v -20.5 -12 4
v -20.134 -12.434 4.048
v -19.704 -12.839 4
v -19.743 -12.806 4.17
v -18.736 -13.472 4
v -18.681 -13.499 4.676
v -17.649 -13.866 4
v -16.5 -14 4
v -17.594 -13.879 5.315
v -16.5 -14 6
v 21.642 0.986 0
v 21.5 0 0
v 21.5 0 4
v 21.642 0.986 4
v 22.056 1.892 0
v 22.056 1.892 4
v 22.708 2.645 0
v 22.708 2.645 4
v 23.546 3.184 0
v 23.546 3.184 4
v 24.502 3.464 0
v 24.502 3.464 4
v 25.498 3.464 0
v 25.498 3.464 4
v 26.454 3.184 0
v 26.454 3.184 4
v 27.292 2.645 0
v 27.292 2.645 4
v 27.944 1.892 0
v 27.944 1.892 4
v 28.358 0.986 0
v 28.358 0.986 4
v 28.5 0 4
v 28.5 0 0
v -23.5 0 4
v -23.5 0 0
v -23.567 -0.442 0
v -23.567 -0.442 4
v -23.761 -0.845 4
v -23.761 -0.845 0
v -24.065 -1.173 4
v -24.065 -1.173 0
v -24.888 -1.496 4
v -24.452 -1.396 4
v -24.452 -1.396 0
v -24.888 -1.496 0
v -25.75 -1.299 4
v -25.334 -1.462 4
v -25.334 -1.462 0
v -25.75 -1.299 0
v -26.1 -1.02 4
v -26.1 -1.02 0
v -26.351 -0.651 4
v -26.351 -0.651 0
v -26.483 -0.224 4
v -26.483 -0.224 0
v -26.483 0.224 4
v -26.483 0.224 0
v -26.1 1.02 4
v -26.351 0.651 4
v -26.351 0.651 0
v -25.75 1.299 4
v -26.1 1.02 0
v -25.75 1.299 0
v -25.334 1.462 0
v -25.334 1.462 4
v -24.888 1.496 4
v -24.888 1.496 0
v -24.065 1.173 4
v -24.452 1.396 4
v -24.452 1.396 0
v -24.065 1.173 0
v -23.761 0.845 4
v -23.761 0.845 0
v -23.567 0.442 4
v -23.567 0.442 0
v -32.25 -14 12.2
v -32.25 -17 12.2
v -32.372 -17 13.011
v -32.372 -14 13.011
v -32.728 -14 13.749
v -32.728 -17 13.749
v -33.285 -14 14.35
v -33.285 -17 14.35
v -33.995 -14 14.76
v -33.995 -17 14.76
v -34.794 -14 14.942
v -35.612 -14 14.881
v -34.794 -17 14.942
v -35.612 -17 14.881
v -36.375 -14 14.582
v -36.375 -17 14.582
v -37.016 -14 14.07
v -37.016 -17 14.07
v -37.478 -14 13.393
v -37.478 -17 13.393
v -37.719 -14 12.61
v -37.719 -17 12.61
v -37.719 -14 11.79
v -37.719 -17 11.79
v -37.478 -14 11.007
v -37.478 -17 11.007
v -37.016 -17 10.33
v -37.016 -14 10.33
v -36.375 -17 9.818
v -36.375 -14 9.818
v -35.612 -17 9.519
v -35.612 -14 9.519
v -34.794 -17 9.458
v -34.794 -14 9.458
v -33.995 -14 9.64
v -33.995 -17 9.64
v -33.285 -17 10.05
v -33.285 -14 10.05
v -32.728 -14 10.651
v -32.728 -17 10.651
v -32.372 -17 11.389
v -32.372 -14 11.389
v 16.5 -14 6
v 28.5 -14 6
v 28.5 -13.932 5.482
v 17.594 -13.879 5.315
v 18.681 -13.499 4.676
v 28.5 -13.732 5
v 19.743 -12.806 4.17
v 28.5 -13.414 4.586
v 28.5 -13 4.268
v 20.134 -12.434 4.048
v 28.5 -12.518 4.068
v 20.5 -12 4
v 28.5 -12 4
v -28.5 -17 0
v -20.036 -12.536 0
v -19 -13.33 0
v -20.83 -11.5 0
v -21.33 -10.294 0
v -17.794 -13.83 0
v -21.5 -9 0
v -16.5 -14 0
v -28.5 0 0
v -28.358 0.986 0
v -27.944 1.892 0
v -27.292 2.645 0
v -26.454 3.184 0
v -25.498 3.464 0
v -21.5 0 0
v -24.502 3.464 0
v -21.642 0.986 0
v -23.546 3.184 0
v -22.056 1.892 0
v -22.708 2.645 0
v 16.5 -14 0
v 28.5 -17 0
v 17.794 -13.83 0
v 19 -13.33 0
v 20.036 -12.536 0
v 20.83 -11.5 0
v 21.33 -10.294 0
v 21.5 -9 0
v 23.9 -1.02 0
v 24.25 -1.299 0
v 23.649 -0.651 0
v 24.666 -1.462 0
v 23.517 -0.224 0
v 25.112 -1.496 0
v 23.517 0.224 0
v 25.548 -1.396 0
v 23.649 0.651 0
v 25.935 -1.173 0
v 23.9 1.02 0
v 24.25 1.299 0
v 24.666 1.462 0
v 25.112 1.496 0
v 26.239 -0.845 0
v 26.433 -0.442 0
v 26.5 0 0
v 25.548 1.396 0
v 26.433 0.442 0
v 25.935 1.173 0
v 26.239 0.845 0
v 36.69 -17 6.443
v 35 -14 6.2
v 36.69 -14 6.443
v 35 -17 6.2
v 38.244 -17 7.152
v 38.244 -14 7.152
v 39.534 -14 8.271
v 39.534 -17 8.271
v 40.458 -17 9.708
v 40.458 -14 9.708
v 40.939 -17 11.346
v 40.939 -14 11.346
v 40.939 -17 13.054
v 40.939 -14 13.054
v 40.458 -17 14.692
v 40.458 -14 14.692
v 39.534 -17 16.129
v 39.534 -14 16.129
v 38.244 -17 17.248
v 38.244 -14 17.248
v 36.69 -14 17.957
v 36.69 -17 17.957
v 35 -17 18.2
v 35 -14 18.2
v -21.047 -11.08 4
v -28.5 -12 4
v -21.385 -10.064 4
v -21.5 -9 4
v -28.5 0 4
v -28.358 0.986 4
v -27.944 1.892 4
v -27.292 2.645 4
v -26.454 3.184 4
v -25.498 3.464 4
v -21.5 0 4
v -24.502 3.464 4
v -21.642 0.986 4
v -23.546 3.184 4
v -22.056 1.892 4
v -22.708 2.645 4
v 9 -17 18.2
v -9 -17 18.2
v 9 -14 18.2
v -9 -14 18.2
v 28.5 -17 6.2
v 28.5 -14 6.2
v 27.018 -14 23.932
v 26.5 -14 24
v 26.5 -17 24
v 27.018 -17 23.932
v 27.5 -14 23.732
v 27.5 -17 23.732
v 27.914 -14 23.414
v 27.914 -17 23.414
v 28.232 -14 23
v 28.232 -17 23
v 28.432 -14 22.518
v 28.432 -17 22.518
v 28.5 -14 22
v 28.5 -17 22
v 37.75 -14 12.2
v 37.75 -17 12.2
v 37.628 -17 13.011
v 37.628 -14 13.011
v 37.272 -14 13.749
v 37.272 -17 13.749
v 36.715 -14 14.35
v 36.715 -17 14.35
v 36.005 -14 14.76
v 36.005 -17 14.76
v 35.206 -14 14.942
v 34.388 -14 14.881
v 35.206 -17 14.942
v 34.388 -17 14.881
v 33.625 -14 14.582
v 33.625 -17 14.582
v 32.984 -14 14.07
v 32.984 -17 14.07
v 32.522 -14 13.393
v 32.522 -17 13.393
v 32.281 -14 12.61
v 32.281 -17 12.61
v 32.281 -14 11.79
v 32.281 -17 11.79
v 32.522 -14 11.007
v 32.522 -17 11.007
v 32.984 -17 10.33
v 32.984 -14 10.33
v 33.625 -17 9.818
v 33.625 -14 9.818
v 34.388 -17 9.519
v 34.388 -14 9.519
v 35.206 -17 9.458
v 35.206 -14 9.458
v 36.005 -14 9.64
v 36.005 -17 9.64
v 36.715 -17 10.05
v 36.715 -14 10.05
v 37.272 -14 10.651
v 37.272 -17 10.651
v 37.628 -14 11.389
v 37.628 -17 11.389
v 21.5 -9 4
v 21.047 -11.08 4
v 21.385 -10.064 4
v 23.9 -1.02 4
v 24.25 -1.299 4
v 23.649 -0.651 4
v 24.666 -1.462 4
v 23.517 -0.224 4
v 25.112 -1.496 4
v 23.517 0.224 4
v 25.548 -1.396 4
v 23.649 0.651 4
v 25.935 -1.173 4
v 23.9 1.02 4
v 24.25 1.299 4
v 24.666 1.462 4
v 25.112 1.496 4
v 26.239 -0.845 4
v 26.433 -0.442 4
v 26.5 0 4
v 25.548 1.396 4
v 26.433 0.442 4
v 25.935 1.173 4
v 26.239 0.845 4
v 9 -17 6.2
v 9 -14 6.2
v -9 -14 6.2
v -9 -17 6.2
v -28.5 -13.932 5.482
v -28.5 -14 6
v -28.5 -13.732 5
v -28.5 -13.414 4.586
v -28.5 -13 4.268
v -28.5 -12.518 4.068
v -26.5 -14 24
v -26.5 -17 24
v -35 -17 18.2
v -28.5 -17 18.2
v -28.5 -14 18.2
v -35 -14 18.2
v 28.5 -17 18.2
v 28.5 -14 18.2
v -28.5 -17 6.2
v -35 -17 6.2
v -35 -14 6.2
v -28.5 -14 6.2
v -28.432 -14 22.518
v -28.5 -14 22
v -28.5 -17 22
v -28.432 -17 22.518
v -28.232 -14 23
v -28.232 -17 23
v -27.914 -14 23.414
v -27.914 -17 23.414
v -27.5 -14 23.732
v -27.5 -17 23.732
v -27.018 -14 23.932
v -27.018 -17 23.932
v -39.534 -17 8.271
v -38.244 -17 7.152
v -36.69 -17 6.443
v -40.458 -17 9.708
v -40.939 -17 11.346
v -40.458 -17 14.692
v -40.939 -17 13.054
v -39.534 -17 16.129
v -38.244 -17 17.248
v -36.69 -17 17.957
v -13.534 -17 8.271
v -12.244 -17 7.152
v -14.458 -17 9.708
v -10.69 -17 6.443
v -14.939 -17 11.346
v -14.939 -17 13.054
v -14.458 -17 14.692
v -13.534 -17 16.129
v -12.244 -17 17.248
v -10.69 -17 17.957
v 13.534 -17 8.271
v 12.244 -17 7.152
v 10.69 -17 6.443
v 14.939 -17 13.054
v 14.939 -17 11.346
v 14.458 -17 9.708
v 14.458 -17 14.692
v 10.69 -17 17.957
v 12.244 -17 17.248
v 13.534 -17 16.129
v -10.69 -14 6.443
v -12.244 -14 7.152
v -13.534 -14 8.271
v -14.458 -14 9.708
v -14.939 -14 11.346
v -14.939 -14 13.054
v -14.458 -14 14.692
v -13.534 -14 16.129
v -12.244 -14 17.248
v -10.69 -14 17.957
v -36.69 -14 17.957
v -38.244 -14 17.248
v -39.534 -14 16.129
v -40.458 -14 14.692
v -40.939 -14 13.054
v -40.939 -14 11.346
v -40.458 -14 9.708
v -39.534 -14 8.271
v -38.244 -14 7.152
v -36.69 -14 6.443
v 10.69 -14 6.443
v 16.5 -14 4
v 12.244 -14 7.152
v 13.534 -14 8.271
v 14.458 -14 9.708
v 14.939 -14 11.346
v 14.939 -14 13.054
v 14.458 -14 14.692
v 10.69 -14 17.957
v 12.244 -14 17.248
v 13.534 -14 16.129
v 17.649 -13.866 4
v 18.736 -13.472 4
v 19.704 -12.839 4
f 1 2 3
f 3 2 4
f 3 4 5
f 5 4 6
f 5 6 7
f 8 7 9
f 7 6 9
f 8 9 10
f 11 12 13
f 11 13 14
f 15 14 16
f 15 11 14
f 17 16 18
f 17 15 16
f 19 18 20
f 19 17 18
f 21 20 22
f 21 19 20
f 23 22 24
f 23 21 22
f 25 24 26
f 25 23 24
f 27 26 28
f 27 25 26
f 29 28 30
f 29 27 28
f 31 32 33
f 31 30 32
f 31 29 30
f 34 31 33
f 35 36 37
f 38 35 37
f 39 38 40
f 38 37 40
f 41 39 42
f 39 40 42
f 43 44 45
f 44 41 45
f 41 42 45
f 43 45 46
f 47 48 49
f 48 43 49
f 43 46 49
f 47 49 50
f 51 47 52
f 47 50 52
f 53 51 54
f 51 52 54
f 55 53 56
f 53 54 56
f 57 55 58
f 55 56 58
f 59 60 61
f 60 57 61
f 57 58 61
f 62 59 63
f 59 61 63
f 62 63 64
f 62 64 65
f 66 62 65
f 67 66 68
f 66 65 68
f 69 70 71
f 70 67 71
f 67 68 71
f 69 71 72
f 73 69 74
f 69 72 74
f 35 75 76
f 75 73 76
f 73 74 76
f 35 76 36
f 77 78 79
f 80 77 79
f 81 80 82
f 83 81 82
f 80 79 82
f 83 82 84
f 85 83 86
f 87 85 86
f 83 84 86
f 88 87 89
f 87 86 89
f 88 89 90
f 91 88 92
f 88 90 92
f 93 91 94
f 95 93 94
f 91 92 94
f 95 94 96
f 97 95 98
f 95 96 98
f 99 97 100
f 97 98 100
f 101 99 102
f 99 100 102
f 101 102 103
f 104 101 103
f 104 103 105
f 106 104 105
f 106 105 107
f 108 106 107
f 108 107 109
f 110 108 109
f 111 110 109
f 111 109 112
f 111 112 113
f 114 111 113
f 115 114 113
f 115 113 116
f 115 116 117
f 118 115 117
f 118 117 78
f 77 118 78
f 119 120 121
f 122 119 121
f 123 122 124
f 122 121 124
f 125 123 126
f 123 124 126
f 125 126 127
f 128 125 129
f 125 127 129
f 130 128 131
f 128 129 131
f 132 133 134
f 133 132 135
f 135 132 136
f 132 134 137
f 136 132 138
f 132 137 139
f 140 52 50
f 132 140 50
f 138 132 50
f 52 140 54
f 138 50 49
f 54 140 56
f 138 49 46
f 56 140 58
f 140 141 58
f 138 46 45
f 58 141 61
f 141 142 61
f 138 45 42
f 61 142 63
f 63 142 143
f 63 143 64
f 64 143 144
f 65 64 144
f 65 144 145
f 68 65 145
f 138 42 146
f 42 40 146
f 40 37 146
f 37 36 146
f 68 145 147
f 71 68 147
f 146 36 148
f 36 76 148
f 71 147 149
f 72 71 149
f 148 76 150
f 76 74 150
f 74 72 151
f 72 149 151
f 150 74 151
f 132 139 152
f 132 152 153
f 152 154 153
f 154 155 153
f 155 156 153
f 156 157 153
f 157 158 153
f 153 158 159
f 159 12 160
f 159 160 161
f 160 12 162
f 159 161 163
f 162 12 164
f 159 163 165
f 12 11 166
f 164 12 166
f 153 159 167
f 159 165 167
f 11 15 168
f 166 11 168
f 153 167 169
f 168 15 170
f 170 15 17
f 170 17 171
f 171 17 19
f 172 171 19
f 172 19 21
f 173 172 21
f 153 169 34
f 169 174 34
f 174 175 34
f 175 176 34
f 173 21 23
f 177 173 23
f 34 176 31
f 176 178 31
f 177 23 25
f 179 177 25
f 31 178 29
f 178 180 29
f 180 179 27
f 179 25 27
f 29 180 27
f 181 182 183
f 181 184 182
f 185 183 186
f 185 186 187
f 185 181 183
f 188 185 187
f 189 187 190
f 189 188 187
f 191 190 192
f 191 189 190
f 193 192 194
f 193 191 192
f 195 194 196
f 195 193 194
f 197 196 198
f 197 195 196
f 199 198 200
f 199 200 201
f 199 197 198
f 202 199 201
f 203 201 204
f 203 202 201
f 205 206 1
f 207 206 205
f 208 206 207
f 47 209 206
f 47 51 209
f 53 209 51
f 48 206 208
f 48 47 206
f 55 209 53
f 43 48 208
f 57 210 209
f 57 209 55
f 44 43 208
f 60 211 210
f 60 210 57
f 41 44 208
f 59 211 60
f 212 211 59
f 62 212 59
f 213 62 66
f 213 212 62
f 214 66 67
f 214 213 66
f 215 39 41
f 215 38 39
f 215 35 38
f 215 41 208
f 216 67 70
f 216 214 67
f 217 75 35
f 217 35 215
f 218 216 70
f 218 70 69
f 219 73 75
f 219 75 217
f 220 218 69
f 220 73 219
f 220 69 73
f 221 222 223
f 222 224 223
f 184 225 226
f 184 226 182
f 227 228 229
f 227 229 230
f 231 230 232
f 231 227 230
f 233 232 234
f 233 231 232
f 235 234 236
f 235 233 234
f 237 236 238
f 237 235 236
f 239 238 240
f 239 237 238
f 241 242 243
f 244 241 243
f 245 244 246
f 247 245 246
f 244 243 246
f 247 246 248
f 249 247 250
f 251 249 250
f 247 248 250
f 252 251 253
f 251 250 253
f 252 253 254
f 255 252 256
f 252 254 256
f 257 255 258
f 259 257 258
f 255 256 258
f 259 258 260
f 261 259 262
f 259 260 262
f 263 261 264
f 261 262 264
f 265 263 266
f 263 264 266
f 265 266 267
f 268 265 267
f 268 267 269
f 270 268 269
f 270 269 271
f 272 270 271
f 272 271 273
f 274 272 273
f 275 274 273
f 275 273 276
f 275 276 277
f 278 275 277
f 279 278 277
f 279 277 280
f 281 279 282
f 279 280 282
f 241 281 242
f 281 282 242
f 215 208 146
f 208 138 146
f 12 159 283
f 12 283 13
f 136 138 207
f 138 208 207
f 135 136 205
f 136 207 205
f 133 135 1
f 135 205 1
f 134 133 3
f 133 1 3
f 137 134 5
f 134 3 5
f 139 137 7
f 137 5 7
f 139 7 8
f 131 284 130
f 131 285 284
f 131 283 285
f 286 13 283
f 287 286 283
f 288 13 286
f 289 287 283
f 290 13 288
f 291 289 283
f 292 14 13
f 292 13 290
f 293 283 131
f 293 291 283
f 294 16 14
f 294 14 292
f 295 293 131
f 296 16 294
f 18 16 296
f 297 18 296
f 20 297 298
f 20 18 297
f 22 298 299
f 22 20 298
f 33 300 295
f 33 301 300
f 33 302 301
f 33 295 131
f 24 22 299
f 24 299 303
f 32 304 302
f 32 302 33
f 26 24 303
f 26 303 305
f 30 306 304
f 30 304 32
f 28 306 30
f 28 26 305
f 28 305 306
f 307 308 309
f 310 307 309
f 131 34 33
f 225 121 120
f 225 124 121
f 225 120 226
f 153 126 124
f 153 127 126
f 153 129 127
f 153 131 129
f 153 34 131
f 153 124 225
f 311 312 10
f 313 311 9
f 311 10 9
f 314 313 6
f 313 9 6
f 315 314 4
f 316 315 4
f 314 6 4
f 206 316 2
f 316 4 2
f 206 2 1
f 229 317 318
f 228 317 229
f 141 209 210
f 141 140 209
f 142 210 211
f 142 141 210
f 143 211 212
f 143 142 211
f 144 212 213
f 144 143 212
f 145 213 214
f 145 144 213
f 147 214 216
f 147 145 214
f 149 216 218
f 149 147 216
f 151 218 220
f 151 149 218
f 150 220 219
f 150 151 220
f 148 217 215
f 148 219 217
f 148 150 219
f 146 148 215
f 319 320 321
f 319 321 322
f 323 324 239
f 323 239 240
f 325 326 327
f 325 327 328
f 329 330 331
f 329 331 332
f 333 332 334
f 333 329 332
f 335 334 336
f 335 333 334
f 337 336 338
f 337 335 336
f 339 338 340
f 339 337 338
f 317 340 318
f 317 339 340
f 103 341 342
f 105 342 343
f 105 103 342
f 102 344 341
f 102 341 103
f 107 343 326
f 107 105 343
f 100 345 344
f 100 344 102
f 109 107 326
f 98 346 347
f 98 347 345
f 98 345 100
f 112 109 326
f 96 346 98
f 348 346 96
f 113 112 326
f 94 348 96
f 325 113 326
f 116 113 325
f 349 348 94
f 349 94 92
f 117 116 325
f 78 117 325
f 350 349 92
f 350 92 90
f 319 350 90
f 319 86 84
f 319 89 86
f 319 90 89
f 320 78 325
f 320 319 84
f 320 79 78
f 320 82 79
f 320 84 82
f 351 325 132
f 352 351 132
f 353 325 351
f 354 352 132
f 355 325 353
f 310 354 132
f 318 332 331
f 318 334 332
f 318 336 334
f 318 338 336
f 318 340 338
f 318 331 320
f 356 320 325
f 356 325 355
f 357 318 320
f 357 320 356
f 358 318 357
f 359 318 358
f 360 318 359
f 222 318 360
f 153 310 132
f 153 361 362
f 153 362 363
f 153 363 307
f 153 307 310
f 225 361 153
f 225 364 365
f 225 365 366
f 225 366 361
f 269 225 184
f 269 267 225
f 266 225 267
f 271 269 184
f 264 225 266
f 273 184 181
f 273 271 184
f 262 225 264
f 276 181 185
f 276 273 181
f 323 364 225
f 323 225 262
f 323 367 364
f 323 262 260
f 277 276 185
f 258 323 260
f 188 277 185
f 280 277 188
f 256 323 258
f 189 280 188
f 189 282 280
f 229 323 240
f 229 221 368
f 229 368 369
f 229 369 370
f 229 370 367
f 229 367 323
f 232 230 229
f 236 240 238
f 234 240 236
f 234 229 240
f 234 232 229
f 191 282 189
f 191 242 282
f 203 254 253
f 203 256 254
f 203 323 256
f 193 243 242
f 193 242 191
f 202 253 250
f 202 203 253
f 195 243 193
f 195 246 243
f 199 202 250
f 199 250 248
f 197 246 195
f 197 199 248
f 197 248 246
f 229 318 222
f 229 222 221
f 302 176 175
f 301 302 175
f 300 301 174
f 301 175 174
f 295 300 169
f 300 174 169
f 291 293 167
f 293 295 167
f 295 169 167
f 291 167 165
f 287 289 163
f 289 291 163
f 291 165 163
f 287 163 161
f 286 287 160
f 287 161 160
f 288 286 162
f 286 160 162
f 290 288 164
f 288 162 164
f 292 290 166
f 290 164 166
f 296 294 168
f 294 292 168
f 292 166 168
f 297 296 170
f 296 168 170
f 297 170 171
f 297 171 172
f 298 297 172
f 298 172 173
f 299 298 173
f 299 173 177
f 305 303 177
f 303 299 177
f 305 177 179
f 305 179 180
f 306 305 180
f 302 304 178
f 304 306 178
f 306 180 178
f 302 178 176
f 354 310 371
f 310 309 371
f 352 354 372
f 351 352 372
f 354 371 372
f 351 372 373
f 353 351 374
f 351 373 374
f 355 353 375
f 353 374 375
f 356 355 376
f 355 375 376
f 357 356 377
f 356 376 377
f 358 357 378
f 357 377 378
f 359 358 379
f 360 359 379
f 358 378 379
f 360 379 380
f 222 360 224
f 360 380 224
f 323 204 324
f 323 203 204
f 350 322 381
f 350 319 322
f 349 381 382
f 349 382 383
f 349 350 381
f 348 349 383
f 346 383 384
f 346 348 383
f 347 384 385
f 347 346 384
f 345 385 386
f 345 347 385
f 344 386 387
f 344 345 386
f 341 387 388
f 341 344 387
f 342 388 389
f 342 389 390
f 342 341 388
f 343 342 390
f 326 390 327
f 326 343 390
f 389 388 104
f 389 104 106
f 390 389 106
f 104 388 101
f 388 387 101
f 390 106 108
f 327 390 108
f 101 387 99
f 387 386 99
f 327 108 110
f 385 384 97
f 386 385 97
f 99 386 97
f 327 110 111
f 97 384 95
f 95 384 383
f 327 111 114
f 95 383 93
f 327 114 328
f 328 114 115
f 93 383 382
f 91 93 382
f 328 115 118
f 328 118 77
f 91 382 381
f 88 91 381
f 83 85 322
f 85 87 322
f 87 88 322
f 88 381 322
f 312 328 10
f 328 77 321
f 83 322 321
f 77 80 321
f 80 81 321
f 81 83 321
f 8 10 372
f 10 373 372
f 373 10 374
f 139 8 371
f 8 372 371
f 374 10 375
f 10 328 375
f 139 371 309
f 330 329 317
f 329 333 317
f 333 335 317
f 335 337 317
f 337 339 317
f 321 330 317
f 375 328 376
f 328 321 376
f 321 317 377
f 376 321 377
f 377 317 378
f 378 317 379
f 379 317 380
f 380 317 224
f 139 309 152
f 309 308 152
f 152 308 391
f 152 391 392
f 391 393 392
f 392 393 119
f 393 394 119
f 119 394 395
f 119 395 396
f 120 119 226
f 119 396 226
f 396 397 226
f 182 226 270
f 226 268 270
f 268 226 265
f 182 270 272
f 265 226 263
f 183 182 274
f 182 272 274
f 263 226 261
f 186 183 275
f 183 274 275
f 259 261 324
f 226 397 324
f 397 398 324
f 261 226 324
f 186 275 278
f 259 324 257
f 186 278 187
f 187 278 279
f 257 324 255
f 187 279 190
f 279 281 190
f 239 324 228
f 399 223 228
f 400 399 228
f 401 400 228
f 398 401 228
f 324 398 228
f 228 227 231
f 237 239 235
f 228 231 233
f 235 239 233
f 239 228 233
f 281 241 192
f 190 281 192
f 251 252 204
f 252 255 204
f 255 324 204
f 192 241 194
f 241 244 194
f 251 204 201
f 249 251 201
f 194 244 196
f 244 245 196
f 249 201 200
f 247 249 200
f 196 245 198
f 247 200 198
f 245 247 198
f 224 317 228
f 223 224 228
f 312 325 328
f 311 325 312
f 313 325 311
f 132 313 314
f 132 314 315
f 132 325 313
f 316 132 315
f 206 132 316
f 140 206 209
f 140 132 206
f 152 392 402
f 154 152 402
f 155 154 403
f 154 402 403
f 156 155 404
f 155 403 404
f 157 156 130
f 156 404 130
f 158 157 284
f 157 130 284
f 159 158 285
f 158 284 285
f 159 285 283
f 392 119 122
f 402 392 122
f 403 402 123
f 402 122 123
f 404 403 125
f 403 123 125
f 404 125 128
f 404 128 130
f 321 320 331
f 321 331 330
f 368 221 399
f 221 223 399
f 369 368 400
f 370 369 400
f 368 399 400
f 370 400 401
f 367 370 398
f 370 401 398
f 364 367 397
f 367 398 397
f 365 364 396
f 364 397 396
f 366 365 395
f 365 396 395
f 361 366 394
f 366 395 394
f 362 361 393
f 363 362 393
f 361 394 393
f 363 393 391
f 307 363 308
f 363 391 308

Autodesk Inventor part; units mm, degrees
ref_plane "YZ Plane" through (0, 0, 0) normal (1, 0, 0) x (0, 1, 0)
ref_plane "XZ Plane" through (0, 0, 0) normal (0, 1, 0) x (-1, 0, 0)
ref_plane "XY Plane" through (0, 0, 0) normal (0, 0, 1) x (1, 0, 0)
sketch "Sketch1" plane through (0, 0, 0) normal (0, 0, 1) x (1, 0, 0)
  line L0 (0, 0) -> (-25, 0) construction
  line L1 (0, 0) -> (25, 0) construction
  circle A0 centre (-25, 0) radius 1.5
  circle A1 centre (25, 0) radius 1.5
  line L2 (-21.5, -14) -> (21.5, -14)
  line L3 (28.5, -11.1976) -> (28.5, -17)
  line L4 (28.5, -17) -> (-28.5, -17)
  line L5 (-28.5, -17) -> (-28.5, 0.6332)
  line L6 (-21.5, -14) -> (-21.5, 0)
  line L7 (-28.5, 0) -> (-28.5, 0.6332)
  line L8 (21.5, -14) -> (21.5, 0)
  line L9 (28.5, 0) -> (28.5, -11.1976)
  arc A2 (28.5, 0) -> (21.5, 0) centre (25, 0) ccw
  arc A3 (-21.5, 0) -> (-28.5, 0) centre (-25, 0) ccw
  dimension "d0" = 50
  dimension "d1" = 3
  dimension "d2" = 3.5
  dimension "d3" = 17
  dimension "d4" = 3
extrude "Extrusion1" add sketch "Sketch1" along normal blind 4
sketch "Sketch2" plane through (0, 0, 4) normal (0, 0, 1) x (1, 0, 0)
  line L0 (28.5, -17) -> (28.5, 0) projected
  line L1 (28.5, -17) -> (-28.5, -17)
  line L2 (-28.5, -17) -> (-28.5, -14)
  line L3 (-28.5, -14) -> (28.5, -14)
  line L4 (28.5, -14) -> (28.5, -17)
  line L5 (-28.5, 0) -> (-28.5, -17) projected
  point P0 (0, 0)
  point P1 (-21.5, -14)
extrude "Extrusion2" add sketch "Sketch2" along normal blind 20
sketch "Sketch3" plane through (-28.5, -17, 0) normal (0, -1, 0) x (1, 0, 0)
  line L0 (28.5, 0) -> (28.5, 12.2) construction
  line L1 (-6.5, 12.2) -> (63.5, 12.2) construction
  line L2 (0, 24) -> (57, 24) projected
  line L3 (-6.5, 6.2) -> (63.5, 6.2)
  line L4 (63.5, 18.2) -> (-6.5, 18.2)
  arc A0 (-6.5, 18.2) -> (-6.5, 6.2) centre (-6.5, 12.2) ccw
  arc A1 (63.5, 6.2) -> (63.5, 18.2) centre (63.5, 12.2) ccw
  line L5 (0, 4) -> (7, 4) projected
  circle A2 centre (-6.5, 12.2) radius 2.75
  circle A3 centre (63.5, 12.2) radius 2.75
  dimension "d9" = 6
  dimension "d10" = 70
  dimension "d11" = 8.2
  dimension "d12" = 5.5
extrude "Extrusion3" add sketch "Sketch3" against normal up to surface (3 mm away)
sketch "Sketch4" plane through (-21.5, -14, 0) normal (0, 1, 0) x (1, 0, 0)
  circle A0 centre (-13.5, -12.2) radius 2.75 construction
  line L0 (-13.5, -12.2) -> (21.5, -12.2) construction
  line L1 (21.5, -12.2) -> (21.5, 0) construction
  line L2 (-7, 0) -> (50, 0) construction
  line L3 (30.5, -12.2) -> (12.5, -12.2) construction
  line L4 (30.5, -6.2) -> (12.5, -6.2)
  line L5 (12.5, -18.2) -> (30.5, -18.2)
  arc A1 (30.5, -18.2) -> (30.5, -6.2) centre (30.5, -12.2) ccw
  arc A2 (12.5, -6.2) -> (12.5, -18.2) centre (12.5, -12.2) ccw
  dimension "d15" = 6
  dimension "d16" = 18
extrude "Extrusion4" cut sketch "Sketch4" against normal through all
fillet "Fillet1" radius 2 2 edges at (-28.5, -15.5, 24) (28.5, -15.5, 24)
fillet "Fillet2" radius 2 2 edges at (-25, -14, 4) (25, -14, 4)
fillet "Fillet3" radius 5 4 edges at (-21.5, -14, 5) (-21.5, -14, 2) (21.5, -14, 2) (21.5, -14, 5)
properties part number "IntegzaBracket"
